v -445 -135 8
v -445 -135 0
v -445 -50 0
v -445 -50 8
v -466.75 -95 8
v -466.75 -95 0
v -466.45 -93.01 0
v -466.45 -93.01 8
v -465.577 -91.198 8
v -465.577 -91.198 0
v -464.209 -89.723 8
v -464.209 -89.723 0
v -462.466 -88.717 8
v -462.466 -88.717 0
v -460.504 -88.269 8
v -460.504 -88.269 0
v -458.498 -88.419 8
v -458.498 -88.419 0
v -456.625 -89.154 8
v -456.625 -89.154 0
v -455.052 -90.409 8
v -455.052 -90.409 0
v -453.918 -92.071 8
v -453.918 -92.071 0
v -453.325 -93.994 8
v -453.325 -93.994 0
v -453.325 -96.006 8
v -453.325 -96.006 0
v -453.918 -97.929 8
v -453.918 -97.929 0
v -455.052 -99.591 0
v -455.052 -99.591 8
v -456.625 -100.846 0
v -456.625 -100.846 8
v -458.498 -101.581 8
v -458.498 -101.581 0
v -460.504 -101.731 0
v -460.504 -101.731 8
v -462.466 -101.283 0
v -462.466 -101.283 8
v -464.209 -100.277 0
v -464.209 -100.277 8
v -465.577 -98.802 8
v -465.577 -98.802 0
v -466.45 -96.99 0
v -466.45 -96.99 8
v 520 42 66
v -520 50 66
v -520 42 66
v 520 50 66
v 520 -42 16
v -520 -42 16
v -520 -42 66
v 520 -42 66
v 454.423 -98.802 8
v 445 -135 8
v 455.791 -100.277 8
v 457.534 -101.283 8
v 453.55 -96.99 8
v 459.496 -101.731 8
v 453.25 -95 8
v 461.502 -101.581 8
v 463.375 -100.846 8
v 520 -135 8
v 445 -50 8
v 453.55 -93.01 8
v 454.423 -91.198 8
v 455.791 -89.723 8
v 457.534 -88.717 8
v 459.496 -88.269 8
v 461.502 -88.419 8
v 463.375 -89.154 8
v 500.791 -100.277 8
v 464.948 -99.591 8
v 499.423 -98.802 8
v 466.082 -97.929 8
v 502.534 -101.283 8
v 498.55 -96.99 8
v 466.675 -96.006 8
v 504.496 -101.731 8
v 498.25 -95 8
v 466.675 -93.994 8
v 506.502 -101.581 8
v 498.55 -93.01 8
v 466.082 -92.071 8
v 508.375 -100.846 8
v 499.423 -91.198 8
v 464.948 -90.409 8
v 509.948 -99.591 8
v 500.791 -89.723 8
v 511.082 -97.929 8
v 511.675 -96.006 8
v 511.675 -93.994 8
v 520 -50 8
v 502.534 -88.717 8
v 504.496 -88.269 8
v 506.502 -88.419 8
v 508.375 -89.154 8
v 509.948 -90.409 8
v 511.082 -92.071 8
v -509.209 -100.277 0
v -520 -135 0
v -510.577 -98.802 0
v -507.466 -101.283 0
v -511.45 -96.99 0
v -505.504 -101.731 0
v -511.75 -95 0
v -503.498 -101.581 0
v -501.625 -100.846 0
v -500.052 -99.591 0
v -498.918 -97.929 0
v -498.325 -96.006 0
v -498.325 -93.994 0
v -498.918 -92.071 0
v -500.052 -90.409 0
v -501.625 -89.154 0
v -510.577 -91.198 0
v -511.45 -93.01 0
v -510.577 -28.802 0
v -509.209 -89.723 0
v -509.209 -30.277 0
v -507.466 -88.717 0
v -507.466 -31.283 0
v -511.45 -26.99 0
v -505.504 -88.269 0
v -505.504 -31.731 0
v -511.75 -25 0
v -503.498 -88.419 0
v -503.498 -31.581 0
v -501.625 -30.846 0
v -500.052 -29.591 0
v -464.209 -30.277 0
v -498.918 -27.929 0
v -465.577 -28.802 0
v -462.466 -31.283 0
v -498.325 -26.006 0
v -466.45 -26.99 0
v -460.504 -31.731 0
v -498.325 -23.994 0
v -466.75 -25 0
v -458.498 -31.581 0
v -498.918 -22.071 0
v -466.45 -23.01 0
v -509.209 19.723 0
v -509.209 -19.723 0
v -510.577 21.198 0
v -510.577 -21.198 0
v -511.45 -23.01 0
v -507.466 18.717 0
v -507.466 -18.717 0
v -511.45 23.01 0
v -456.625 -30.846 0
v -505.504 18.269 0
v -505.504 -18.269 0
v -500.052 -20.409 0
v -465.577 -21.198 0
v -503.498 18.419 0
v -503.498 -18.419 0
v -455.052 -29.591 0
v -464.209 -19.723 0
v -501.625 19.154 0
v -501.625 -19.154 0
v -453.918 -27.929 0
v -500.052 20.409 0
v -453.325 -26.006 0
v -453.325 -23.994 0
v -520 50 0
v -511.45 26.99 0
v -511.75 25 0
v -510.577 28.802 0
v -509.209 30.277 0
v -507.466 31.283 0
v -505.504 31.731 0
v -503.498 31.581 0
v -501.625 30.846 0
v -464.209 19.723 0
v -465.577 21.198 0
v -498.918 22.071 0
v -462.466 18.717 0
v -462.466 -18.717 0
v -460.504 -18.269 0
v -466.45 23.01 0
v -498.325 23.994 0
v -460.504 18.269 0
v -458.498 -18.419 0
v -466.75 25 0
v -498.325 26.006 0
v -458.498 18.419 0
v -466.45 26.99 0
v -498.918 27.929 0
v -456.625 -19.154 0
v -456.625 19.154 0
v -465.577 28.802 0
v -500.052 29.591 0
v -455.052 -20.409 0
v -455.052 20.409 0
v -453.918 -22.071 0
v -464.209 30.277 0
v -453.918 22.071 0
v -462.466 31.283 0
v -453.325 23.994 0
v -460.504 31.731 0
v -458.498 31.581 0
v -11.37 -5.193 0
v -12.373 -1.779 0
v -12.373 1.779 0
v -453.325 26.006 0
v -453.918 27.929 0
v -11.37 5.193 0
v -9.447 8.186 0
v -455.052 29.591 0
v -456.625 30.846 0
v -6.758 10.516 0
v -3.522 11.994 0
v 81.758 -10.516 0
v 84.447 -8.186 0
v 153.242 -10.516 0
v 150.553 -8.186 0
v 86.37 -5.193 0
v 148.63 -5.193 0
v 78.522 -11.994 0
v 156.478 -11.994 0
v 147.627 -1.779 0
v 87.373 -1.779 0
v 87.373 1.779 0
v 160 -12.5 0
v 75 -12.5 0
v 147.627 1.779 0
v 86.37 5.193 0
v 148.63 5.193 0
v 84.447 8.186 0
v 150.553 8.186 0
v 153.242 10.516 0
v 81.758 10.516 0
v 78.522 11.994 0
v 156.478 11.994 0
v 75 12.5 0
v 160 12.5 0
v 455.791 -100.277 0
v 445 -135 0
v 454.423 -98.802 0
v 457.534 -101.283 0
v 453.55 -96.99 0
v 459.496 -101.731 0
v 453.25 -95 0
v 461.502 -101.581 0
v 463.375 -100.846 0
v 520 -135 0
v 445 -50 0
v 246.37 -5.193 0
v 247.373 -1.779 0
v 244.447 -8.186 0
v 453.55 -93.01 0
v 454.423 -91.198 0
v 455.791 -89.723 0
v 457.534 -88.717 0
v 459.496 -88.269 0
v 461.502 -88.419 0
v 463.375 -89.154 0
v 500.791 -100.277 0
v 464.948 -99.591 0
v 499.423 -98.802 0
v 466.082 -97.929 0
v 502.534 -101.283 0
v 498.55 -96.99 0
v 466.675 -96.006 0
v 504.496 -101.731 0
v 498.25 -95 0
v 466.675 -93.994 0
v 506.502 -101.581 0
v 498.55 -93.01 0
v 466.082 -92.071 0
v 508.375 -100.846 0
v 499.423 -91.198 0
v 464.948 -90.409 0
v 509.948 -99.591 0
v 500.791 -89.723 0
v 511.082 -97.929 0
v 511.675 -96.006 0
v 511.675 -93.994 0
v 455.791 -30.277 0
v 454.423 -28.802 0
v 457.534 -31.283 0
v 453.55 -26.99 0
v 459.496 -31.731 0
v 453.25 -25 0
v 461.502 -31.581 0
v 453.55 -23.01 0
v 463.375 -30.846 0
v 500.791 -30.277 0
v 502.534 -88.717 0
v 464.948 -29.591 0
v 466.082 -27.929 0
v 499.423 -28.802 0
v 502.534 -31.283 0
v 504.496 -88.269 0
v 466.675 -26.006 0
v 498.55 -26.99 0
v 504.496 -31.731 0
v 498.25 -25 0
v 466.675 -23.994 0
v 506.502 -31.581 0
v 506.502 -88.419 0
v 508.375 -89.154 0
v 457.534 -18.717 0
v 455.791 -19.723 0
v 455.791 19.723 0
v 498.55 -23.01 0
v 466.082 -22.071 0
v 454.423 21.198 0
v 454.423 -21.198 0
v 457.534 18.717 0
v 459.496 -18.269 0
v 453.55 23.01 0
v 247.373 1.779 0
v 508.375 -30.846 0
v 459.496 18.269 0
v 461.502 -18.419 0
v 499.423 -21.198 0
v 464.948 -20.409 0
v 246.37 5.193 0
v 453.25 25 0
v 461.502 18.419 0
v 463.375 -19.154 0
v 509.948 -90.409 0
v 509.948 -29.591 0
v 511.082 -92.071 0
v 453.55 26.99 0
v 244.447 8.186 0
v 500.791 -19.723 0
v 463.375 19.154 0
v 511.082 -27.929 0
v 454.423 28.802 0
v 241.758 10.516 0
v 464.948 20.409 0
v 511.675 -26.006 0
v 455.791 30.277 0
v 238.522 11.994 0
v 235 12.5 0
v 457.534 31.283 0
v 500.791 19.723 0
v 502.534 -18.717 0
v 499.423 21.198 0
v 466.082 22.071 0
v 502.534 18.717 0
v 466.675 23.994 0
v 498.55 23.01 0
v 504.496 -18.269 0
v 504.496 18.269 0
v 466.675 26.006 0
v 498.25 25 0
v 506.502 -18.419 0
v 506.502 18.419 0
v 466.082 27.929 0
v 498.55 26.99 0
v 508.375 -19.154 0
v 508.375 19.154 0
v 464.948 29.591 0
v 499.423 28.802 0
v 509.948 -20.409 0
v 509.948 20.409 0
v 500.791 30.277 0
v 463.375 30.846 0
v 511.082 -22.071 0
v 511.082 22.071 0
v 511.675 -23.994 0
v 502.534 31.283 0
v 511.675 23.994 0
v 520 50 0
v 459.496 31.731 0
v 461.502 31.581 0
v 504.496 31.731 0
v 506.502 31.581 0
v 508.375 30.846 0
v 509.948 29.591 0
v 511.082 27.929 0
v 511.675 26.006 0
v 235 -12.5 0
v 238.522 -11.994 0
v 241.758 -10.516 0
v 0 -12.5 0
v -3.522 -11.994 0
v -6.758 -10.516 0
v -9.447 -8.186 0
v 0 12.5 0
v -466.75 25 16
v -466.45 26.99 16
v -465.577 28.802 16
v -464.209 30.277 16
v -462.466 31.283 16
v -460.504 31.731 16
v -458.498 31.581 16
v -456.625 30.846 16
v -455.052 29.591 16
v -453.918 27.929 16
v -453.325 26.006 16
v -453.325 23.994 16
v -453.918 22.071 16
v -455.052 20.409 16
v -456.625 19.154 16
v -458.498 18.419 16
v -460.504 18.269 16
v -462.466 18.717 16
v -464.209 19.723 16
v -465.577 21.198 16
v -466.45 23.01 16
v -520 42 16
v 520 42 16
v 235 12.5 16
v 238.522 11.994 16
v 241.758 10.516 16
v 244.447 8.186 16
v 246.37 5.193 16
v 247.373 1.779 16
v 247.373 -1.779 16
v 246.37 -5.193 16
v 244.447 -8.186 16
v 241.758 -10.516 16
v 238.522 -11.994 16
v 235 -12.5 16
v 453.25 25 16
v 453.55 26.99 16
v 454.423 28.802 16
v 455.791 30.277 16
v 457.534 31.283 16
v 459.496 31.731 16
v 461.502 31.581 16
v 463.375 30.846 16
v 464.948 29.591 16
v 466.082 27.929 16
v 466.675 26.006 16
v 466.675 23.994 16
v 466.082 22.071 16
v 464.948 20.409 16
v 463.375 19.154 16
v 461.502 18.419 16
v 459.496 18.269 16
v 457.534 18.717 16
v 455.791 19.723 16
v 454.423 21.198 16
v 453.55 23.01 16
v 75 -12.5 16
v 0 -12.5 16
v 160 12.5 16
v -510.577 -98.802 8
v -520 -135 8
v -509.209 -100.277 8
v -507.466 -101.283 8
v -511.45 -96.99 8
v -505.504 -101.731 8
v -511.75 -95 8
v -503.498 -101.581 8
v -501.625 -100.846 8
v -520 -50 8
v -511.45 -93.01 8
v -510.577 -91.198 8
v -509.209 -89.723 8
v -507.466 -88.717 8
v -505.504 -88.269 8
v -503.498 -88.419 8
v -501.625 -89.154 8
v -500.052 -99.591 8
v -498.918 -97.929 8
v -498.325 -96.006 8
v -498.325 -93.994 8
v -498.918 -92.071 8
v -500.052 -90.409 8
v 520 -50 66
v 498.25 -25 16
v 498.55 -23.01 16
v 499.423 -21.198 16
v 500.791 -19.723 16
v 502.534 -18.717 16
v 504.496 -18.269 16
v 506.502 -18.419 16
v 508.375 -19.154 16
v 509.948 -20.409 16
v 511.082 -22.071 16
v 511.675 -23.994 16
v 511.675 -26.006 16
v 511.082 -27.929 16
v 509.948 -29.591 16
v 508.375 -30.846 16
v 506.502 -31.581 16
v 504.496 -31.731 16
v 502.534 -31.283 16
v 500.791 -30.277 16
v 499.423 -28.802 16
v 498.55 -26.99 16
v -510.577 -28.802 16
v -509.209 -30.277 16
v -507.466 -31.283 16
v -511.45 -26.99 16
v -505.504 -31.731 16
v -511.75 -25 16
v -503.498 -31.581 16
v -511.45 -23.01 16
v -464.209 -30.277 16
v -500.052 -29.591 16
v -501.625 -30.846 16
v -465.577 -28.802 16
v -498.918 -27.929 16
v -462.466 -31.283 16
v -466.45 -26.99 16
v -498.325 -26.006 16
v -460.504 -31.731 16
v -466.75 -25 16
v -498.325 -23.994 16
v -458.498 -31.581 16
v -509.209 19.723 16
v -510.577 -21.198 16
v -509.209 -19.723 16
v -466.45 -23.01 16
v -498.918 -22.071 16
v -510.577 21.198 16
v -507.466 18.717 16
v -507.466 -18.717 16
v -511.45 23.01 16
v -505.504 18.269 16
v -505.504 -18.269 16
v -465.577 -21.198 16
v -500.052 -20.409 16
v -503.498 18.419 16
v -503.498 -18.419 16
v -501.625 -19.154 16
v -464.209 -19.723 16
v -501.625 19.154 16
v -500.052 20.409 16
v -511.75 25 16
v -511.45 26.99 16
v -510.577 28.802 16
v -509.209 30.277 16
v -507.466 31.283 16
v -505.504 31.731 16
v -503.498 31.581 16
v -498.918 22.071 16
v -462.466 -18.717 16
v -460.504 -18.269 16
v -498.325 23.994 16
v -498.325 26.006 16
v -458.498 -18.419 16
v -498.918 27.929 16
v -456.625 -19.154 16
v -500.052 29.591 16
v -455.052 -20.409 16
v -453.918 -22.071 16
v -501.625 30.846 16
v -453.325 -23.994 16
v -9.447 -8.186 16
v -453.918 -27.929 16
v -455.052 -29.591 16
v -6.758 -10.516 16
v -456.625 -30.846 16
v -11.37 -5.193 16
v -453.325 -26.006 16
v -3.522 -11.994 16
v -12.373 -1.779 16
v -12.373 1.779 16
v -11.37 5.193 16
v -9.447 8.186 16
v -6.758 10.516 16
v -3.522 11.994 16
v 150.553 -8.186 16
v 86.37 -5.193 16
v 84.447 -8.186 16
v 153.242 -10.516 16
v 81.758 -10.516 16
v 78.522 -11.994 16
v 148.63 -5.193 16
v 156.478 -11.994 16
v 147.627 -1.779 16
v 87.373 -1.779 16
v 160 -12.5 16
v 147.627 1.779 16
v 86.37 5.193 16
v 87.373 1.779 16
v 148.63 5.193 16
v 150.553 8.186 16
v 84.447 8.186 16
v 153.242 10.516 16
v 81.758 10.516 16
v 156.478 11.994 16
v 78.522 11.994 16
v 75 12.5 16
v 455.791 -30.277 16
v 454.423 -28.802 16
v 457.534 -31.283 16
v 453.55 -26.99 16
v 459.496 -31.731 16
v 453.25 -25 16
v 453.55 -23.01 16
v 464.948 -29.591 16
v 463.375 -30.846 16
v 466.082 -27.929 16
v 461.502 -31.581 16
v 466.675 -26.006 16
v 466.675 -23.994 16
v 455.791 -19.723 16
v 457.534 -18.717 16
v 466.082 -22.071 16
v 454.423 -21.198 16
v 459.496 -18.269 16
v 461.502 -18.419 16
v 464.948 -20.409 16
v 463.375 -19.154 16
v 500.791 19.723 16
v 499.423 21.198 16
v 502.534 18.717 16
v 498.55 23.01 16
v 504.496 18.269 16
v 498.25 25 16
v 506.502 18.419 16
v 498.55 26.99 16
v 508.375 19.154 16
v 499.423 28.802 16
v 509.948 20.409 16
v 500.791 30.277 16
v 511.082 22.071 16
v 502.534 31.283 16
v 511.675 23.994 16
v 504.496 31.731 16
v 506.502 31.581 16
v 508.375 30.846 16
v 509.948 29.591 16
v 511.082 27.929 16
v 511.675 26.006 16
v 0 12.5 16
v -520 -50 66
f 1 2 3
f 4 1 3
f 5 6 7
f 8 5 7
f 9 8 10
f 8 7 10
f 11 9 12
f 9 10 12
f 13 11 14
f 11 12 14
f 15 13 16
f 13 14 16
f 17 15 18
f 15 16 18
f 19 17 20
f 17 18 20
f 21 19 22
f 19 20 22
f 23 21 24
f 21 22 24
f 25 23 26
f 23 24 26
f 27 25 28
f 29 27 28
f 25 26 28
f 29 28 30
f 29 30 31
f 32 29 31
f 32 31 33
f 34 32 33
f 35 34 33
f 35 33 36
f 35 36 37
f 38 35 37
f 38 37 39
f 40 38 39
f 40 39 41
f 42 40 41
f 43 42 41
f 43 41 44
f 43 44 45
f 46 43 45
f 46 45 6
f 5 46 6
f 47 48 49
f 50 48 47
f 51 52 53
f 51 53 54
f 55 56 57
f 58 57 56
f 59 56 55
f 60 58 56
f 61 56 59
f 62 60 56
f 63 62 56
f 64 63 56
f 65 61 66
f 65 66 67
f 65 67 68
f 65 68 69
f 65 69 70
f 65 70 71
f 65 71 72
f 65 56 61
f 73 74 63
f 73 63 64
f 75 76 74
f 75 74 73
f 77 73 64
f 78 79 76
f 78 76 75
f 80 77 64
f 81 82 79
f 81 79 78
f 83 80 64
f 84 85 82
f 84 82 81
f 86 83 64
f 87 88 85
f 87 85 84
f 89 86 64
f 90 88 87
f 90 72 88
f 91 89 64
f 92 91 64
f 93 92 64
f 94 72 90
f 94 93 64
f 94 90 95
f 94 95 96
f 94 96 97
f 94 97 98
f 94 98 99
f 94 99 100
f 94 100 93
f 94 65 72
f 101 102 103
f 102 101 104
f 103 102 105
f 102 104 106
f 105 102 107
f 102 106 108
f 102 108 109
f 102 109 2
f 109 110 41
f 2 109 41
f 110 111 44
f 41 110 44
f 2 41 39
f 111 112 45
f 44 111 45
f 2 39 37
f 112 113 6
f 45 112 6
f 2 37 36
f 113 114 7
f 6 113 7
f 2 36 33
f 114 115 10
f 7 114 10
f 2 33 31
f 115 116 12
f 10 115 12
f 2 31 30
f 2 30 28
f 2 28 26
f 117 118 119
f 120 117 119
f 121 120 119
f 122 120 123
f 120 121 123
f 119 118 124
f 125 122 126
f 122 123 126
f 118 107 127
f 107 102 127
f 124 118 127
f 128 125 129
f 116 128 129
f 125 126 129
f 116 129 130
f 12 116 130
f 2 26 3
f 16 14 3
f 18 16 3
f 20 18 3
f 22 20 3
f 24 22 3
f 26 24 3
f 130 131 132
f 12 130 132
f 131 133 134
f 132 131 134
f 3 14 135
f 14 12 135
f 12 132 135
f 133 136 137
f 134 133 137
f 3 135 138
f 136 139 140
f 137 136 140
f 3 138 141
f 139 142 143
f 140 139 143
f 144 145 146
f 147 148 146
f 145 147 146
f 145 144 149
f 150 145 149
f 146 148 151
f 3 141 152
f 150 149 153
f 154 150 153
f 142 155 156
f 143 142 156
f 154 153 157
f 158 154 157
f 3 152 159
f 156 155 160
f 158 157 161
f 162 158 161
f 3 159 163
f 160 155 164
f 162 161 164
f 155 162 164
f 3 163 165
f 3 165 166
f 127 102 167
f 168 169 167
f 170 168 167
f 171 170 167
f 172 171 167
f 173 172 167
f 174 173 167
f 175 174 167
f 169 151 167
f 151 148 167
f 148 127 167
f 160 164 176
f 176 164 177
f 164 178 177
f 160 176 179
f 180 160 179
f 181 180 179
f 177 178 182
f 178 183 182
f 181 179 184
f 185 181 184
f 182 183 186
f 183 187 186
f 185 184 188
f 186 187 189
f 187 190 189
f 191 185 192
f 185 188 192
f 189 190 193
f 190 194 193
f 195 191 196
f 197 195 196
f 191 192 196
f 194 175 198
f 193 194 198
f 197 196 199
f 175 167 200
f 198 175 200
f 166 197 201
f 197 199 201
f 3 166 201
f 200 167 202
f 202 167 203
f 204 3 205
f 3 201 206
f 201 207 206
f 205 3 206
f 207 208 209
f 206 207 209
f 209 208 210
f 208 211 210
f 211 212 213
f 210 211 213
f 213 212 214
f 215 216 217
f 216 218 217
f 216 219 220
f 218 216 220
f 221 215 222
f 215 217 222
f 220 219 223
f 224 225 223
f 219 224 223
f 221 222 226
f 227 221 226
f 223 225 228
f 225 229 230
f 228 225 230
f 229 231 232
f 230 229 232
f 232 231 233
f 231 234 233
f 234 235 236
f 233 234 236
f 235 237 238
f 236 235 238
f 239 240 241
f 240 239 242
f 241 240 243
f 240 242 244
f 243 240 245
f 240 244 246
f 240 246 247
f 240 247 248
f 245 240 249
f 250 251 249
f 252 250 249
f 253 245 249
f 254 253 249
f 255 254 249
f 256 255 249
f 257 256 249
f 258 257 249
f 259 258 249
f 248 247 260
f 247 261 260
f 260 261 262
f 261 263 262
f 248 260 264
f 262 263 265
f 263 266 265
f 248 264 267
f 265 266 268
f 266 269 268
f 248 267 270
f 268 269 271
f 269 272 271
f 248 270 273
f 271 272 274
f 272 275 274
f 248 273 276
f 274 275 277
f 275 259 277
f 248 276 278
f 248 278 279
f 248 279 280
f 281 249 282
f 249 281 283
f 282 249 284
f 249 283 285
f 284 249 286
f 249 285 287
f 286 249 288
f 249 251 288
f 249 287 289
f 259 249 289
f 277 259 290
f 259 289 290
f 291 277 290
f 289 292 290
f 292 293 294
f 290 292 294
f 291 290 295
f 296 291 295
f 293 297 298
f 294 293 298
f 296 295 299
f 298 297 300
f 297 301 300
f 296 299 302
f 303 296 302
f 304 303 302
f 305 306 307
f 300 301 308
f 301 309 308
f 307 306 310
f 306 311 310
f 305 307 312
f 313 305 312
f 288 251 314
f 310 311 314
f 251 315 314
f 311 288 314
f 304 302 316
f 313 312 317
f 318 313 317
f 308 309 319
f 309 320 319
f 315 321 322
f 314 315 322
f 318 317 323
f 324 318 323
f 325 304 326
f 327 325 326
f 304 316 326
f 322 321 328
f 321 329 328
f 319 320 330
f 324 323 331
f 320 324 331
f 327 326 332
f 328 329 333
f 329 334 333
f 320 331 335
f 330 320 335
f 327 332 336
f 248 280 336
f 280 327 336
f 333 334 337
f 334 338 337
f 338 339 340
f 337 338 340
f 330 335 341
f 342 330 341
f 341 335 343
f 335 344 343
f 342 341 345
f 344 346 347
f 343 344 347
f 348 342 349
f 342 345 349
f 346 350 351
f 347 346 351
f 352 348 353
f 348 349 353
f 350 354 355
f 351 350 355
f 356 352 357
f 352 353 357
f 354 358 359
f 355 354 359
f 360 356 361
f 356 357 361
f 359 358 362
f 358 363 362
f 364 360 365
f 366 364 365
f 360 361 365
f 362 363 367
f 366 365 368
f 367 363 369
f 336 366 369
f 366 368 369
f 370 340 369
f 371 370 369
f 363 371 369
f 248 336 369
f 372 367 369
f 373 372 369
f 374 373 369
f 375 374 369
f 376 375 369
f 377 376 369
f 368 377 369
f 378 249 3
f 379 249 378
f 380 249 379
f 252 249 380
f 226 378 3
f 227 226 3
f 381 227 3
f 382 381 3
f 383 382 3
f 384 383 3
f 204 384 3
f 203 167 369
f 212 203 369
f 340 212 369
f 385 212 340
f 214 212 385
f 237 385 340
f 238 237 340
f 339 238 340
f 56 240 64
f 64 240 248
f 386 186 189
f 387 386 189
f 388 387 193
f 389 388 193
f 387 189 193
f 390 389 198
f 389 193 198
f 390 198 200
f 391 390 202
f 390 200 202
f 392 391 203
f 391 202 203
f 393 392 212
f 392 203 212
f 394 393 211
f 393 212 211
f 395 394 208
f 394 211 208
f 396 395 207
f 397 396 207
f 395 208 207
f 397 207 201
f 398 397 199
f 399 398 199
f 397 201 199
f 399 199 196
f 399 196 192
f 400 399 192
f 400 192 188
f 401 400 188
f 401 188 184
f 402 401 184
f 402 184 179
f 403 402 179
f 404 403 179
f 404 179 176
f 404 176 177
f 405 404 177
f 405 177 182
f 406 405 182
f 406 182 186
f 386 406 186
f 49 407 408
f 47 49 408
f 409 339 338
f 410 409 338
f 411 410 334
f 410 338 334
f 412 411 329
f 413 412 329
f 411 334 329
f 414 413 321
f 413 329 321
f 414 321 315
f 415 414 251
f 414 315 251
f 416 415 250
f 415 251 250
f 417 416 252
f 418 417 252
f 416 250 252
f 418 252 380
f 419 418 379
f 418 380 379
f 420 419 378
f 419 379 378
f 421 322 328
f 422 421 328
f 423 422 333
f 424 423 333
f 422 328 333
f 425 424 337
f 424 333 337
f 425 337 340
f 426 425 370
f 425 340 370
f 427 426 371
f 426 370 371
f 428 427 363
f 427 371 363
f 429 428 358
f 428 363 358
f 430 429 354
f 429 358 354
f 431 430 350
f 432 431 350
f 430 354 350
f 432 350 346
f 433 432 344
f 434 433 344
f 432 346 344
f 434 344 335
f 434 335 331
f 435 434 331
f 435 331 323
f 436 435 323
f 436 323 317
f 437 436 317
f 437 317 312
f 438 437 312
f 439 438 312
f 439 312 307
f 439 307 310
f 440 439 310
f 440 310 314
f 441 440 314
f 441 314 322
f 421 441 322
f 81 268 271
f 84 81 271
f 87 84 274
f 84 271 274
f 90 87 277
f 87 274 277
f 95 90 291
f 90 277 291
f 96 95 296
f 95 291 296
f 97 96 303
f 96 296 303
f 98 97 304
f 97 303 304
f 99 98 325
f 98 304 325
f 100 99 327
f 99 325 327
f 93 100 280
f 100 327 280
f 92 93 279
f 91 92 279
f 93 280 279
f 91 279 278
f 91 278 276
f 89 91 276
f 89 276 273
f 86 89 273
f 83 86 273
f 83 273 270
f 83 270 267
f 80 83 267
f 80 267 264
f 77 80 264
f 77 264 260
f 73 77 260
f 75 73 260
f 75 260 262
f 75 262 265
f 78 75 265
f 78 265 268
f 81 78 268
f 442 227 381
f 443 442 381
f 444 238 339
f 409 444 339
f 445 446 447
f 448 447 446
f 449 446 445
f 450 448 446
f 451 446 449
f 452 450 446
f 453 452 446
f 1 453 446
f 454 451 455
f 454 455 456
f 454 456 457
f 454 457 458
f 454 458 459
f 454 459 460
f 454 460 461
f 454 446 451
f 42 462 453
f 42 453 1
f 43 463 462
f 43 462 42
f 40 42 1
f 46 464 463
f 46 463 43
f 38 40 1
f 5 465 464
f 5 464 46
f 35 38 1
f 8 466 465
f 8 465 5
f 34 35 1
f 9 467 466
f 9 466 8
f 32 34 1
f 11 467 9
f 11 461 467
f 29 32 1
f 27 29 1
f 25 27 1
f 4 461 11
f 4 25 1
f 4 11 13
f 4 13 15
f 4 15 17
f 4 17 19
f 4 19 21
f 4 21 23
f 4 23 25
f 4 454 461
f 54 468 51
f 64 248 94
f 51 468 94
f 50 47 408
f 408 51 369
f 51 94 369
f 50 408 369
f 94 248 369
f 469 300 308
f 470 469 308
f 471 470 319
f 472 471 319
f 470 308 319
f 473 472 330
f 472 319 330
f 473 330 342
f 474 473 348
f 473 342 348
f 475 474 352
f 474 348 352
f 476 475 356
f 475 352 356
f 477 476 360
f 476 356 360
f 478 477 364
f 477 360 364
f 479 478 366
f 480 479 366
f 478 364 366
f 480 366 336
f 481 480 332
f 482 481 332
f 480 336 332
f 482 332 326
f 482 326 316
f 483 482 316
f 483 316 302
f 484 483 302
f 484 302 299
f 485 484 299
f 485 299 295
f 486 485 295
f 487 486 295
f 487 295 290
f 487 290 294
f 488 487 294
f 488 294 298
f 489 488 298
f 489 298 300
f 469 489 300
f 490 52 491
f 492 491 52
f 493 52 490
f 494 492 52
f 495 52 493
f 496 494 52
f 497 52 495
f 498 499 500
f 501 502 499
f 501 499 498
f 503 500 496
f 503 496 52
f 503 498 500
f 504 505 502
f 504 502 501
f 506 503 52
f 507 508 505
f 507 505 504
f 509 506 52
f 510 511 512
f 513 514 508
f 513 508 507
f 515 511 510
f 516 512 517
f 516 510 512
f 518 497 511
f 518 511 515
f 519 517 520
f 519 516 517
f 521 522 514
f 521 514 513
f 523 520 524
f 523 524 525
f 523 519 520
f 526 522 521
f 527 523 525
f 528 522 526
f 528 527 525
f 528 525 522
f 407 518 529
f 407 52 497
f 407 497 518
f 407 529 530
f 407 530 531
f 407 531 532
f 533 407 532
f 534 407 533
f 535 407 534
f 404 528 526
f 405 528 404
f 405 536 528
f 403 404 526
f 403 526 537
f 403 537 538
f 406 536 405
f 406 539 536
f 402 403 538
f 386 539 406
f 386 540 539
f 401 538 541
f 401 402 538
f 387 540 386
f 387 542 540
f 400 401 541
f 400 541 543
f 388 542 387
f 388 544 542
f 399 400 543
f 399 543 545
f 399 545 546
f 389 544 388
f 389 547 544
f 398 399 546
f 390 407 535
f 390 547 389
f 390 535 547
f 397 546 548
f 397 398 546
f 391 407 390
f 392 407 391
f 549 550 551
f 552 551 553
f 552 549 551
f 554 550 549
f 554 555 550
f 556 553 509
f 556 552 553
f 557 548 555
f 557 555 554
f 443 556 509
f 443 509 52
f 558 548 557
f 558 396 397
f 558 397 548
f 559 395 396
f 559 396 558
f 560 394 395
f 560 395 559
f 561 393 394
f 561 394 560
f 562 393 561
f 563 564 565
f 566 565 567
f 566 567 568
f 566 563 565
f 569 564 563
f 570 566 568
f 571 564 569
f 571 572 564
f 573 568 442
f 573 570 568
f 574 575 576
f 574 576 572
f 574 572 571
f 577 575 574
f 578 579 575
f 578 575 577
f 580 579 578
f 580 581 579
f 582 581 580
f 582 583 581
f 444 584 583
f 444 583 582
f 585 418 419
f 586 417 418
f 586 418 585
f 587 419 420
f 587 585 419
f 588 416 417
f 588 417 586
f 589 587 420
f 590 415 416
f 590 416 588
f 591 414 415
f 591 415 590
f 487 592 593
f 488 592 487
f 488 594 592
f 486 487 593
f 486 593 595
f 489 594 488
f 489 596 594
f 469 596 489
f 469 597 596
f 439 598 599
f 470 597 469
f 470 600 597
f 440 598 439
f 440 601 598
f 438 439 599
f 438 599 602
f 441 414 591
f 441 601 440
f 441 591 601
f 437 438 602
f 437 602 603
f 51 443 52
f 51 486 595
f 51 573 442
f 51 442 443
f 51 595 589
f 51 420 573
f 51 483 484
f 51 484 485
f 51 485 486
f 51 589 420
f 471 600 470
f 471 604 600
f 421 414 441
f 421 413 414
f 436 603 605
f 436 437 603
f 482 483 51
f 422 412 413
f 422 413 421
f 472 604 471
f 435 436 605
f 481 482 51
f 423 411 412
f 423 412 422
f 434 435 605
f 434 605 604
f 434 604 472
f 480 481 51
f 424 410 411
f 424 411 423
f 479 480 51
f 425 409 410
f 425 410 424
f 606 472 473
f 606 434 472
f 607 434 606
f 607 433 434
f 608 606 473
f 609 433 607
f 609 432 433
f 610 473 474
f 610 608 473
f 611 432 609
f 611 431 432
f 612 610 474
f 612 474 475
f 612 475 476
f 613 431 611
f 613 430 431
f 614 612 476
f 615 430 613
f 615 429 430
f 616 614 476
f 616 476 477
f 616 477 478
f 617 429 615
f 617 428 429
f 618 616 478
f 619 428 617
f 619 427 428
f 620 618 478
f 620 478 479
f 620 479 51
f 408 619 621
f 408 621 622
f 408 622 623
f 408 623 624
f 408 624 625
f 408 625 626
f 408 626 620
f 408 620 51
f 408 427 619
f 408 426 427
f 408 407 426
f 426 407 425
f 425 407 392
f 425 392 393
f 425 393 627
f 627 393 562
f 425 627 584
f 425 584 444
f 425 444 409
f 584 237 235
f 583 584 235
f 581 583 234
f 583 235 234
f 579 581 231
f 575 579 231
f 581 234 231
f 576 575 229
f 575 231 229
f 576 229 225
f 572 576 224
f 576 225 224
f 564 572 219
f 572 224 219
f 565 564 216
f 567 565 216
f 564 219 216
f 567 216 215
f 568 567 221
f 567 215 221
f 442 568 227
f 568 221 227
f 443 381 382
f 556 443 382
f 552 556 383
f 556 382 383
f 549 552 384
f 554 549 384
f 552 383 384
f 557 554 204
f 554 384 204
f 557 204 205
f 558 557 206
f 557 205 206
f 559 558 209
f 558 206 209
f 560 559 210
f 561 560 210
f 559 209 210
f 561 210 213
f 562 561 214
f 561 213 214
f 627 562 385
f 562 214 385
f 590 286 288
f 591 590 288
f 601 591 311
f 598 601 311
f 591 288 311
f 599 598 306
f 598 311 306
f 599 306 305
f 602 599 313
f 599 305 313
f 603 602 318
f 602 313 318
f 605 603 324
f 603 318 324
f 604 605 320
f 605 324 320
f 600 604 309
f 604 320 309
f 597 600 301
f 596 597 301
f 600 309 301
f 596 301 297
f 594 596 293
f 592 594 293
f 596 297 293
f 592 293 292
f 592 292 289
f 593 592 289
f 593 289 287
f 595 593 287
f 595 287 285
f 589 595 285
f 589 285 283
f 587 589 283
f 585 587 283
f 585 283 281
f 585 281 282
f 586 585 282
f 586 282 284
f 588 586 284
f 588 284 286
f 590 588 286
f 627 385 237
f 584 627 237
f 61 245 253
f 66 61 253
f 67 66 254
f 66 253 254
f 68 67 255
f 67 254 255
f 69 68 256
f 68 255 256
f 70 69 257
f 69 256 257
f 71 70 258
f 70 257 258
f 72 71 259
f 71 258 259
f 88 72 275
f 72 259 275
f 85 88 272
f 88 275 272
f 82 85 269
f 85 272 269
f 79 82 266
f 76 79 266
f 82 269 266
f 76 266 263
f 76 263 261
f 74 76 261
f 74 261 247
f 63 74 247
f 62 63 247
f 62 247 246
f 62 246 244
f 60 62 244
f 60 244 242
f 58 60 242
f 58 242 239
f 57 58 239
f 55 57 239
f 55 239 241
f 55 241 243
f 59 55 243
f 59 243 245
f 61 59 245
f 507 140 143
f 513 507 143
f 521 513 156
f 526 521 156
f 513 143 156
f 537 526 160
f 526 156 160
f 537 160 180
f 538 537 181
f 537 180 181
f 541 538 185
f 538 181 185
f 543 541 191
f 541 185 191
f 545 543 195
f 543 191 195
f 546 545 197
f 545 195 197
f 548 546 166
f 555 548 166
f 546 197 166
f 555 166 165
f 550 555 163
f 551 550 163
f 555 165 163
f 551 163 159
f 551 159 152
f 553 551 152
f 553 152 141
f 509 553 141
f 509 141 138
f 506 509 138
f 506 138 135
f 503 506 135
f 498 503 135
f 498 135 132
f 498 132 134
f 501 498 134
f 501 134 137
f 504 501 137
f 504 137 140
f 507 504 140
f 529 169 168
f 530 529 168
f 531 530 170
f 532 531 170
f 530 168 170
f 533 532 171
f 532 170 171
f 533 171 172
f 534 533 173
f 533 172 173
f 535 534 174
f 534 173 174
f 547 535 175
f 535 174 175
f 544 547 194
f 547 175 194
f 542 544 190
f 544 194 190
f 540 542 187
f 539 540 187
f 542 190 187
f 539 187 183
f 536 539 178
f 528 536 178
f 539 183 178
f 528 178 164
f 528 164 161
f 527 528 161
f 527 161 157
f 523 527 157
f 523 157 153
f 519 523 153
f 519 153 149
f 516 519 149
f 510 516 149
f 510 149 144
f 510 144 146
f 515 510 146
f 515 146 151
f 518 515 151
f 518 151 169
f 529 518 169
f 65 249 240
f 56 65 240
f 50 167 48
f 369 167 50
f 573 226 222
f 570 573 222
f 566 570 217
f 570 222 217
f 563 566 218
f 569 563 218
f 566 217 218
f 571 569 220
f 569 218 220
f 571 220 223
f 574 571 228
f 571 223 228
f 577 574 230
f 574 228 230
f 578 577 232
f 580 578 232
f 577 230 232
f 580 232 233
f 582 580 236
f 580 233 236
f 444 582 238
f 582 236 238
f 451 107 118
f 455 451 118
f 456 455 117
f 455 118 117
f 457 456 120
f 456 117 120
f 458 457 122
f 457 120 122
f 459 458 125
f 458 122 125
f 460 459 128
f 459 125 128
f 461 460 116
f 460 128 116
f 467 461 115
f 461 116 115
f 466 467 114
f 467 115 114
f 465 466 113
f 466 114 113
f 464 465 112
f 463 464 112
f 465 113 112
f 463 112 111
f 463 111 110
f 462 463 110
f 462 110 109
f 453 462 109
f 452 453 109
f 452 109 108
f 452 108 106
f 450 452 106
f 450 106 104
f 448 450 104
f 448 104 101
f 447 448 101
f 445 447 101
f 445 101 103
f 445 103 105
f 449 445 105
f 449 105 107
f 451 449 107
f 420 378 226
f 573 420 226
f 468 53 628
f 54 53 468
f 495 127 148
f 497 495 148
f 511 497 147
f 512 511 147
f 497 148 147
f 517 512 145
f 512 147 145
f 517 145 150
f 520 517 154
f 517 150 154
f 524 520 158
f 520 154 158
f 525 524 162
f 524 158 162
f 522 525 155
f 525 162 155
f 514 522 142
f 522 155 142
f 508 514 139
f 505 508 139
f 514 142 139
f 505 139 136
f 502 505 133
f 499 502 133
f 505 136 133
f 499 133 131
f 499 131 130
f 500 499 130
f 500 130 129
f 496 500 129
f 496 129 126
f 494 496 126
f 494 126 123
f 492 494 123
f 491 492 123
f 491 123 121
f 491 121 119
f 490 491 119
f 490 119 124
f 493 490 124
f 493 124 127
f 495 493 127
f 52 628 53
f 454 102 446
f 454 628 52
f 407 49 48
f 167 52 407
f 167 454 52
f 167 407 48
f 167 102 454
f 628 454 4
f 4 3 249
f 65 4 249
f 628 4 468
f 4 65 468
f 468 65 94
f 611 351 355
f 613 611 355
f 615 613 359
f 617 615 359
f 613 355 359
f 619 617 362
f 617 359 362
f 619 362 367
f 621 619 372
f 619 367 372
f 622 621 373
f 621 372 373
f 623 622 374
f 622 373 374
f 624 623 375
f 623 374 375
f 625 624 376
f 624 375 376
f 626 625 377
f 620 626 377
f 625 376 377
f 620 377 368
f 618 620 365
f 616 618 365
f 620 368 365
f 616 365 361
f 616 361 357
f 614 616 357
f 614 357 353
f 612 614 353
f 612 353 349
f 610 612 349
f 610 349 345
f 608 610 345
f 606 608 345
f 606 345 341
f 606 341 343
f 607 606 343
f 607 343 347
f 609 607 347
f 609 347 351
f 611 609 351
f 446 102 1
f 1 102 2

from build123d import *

# Parameters (mm, degrees)
BOSS_EXTRUDE1_DEPTH     = 8
SKETCH2_W               = 1040
SKETCH2_H               = 100
BOSS_EXTRUDE2_DEPTH     = 8
CUT_EXTRUDE1_DEPTH      = 538.476511115
CUT_EXTRUDE1_DEPTH_BACK = 538.476511115
SKETCH4_W               = 1040
SKETCH4_H               = 8
BOSS_EXTRUDE3_DEPTH     = 50
F_12_0MM_DOWEL_HOLE1_D  = 13.5


with BuildPart() as part:
    # Sketch1 → Boss-Extrude1 (new body)
    with BuildSketch(Plane.XY):
        Polygon((-445, -50), (445, -50), (445, -135), (520, -135), (520, -50), (520, 50), (-520, 50), (-520, -50), (-520, -135), (-445, -135), align=None)
    extrude(amount=BOSS_EXTRUDE1_DEPTH)

    # Sketch2 → Boss-Extrude2 (add)
    with BuildSketch(Plane.XY.offset(8)):
        Rectangle(SKETCH2_W, SKETCH2_H)
    extrude(amount=BOSS_EXTRUDE2_DEPTH)

    # Sketch3 → Cut-Extrude1 (cut, two sides: drawn at the far end of the back side and taken through both)
    with BuildSketch(Plane.XY.offset(16).offset(-CUT_EXTRUDE1_DEPTH_BACK)):
        with BuildLine():
            Line((0, 12.5), (75, 12.5))
            ThreePointArc((75, 12.5), (87.5, 0), (75, -12.5))
            Line((75, -12.5), (0, -12.5))
            ThreePointArc((0, -12.5), (-12.5, 0), (0, 12.5))
        make_face()
        with BuildLine():
            Line((160, 12.5), (235, 12.5))
            ThreePointArc((235, 12.5), (247.5, 0), (235, -12.5))
            Line((235, -12.5), (160, -12.5))
            ThreePointArc((160, -12.5), (147.5, 0), (160, 12.5))
        make_face()
    extrude(amount=CUT_EXTRUDE1_DEPTH + CUT_EXTRUDE1_DEPTH_BACK, mode=Mode.SUBTRACT)

    # Sketch4 → Boss-Extrude3 (add)
    with BuildSketch(Plane.XY.offset(16)):
        with Locations((0, 46)):
            Rectangle(SKETCH4_W, SKETCH4_H)
        with Locations((0, -46)):
            Rectangle(SKETCH4_W, SKETCH4_H)
    extrude(amount=BOSS_EXTRUDE3_DEPTH)

    # Ø12.0mm Dowel Hole1 (through all)
    with Locations(Plane.XY.offset(16)):
        with Locations((-460, 25), (-505, 25), (-505, -25), (-460, -25), (-460, -95), (-505, -95), (460, -95), (505, -95), (505, -25), (460, -25), (460, 25), (505, 25)):
            Hole(F_12_0MM_DOWEL_HOLE1_D / 2)


solid = part.part
